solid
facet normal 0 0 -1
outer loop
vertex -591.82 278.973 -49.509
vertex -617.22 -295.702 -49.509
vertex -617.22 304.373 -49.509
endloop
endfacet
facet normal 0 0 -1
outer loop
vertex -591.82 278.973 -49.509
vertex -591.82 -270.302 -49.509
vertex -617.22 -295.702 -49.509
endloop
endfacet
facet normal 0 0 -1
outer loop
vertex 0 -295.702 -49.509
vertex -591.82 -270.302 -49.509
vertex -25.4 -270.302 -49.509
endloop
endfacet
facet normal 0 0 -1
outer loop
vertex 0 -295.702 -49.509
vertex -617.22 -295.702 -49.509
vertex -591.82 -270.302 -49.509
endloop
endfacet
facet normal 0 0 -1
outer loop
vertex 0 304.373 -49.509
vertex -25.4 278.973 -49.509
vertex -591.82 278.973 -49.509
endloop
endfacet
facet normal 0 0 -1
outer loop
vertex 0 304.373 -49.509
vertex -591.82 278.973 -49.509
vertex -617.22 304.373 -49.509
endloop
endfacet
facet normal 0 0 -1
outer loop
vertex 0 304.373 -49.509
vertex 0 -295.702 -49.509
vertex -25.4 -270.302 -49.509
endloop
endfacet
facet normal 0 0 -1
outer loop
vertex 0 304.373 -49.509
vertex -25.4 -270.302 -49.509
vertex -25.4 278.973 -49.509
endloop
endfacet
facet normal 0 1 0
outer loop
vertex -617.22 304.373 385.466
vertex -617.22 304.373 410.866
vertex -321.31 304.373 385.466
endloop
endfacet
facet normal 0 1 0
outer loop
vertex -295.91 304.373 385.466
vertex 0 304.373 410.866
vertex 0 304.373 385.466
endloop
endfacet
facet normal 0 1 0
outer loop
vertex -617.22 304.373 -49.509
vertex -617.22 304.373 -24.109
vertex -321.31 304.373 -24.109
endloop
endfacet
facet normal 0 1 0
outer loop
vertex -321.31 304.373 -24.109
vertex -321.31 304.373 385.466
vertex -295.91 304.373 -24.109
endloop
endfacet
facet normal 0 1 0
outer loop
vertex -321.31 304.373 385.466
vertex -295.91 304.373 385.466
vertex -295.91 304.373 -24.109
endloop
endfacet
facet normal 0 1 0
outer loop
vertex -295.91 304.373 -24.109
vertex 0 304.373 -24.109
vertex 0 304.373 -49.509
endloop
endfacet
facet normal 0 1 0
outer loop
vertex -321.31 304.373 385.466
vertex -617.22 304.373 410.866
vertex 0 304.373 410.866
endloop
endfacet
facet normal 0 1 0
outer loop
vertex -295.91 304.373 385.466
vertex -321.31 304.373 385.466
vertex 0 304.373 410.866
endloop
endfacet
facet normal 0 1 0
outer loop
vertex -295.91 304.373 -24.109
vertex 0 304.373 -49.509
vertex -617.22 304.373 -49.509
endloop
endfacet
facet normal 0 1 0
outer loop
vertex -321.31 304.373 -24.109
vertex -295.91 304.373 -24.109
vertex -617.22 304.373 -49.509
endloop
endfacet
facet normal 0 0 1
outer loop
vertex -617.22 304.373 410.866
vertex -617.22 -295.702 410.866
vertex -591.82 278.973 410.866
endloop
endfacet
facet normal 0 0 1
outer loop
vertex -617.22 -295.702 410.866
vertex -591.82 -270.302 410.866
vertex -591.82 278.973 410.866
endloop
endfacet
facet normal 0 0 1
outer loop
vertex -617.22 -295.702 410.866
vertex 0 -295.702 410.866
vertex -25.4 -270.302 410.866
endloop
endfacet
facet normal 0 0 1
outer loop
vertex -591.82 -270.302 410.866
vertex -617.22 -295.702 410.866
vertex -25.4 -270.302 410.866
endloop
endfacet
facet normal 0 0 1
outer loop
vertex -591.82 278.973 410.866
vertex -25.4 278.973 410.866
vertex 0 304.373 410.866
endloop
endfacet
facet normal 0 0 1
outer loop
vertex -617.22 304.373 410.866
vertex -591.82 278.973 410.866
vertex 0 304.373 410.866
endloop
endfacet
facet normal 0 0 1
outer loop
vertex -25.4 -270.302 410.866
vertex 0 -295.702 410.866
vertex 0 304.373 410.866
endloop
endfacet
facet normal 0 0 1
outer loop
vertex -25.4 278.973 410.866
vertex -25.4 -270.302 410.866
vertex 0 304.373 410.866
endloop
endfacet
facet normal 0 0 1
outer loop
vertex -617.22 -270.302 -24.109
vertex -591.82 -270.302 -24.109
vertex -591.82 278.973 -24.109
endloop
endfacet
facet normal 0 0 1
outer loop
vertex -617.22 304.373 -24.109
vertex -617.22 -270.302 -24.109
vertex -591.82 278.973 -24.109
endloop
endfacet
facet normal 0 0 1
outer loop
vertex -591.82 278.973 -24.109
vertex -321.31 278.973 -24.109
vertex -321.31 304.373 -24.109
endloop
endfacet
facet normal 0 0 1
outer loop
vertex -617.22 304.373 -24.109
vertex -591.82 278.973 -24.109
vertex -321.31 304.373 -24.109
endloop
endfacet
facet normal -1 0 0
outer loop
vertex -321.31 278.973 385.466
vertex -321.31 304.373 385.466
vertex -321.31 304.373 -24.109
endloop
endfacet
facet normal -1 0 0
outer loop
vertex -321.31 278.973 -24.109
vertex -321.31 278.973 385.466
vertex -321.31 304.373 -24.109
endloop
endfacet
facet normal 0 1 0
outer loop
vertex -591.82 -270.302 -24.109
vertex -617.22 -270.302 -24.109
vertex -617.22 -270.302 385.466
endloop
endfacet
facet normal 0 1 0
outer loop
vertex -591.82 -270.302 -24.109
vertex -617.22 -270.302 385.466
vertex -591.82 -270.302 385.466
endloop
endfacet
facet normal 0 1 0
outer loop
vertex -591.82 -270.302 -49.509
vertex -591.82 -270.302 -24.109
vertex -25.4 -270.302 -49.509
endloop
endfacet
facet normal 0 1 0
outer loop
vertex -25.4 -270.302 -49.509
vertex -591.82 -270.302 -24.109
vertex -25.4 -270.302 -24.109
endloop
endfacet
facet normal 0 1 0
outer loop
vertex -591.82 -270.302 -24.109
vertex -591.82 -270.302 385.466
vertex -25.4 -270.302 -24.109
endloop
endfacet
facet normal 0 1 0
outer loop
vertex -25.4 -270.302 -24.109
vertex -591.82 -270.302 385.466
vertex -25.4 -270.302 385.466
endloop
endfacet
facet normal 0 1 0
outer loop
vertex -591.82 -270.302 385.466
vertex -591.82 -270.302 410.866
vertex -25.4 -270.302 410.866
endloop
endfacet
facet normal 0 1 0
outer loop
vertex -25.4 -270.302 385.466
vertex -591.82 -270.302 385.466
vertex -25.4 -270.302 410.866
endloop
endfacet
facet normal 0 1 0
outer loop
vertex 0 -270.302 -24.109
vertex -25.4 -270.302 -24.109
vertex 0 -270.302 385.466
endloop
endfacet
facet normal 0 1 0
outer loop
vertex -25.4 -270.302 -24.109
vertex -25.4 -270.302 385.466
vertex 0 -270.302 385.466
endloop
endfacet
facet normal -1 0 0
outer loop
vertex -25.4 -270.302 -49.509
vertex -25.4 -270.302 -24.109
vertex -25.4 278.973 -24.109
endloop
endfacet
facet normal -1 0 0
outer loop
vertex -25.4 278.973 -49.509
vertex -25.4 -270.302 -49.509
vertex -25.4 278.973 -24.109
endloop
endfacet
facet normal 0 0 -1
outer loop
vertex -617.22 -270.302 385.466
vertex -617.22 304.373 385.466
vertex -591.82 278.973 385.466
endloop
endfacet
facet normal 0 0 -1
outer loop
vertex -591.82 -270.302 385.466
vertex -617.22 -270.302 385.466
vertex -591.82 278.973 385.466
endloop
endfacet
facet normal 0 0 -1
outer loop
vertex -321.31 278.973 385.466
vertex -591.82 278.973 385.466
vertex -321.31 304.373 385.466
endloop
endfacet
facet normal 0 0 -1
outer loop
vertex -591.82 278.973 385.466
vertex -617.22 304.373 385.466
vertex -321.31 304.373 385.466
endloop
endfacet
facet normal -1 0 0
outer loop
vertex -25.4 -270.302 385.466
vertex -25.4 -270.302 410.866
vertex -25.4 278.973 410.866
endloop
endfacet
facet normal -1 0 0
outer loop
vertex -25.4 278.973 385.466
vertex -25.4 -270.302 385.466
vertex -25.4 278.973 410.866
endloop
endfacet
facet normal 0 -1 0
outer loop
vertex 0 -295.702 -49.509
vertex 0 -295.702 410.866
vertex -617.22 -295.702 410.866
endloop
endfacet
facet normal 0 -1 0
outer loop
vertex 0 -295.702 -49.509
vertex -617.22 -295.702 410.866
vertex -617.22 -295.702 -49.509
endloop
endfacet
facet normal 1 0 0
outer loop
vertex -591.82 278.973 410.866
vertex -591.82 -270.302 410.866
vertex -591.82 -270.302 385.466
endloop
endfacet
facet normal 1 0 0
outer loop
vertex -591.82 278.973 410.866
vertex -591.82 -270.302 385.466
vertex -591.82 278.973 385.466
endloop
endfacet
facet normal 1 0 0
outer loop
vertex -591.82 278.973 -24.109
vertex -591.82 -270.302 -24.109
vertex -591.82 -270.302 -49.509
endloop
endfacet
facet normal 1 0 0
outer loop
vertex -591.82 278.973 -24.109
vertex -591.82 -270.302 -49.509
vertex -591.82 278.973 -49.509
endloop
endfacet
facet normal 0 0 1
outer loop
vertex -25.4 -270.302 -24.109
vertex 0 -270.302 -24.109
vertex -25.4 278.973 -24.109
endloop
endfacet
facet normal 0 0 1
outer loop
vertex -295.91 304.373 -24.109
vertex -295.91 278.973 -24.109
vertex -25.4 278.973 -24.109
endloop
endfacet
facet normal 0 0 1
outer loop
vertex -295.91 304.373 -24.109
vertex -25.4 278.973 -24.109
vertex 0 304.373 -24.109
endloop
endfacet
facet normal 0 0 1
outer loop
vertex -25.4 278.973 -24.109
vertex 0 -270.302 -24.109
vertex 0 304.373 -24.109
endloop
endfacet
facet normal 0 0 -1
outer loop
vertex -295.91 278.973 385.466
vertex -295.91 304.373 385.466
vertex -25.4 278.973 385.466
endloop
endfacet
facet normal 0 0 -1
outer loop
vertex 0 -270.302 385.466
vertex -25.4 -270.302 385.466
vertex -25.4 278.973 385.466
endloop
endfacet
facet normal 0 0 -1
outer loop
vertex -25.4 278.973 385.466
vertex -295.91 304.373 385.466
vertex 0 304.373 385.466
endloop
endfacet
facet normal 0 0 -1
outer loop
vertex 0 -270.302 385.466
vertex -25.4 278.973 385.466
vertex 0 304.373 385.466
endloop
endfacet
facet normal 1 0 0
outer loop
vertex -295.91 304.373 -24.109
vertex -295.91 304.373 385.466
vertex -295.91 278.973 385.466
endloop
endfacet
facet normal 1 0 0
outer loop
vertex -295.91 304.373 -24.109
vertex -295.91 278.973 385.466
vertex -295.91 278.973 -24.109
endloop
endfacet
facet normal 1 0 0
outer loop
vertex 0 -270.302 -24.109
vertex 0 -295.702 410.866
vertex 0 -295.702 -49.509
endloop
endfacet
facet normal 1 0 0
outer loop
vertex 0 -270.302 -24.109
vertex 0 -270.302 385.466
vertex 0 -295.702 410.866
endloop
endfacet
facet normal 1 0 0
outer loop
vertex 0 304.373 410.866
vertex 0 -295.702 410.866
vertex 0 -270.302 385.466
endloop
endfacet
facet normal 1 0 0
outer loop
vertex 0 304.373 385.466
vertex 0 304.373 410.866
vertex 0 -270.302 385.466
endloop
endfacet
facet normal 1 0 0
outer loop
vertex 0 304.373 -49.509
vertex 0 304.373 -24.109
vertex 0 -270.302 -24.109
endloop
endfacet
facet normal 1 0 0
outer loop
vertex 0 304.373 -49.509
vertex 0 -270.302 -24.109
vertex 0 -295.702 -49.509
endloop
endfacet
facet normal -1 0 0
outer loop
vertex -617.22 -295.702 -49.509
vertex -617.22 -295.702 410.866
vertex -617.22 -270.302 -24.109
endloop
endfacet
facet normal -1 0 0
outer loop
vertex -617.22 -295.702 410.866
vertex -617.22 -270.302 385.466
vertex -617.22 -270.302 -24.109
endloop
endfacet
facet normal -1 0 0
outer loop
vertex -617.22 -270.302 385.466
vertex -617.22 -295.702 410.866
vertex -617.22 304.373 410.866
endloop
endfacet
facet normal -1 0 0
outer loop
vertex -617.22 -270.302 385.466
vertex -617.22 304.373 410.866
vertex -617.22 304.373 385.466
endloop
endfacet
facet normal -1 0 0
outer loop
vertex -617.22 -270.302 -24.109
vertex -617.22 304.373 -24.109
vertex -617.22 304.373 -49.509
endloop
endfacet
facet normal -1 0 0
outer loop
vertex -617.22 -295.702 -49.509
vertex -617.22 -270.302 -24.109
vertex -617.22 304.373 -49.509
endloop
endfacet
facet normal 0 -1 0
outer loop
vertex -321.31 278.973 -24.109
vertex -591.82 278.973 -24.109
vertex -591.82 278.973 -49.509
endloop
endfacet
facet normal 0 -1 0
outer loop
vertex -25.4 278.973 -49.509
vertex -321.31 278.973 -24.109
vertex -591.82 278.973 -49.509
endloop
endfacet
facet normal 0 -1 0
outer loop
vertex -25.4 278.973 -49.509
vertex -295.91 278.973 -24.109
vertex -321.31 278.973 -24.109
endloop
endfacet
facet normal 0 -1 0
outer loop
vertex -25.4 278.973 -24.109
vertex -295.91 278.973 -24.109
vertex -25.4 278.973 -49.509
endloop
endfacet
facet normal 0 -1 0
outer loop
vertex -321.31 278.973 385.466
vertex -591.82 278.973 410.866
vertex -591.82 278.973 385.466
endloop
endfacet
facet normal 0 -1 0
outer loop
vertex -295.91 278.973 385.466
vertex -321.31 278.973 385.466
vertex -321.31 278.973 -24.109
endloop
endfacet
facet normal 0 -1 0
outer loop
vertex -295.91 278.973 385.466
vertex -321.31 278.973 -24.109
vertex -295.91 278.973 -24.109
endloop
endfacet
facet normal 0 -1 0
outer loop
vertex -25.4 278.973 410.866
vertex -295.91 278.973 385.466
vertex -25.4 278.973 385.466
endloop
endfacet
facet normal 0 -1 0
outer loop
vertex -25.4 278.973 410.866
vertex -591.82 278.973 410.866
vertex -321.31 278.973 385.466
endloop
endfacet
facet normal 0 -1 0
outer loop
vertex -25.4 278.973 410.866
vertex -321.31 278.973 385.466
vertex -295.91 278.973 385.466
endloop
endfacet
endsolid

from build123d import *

# Parameters (mm, degrees)
SKETCH1_W           = 460.375
SKETCH1_H           = 600.075
SKETCH1_W_2         = 409.575
SKETCH1_H_2         = 549.275
BOSS_EXTRUDE1_DEPTH = 617.22
SKETCH3_W           = 566.42
SKETCH3_H           = 549.275
CUT_EXTRUDE1_DEPTH  = 828.978611889
CUT_EXTRUDE2_REACH  = 955.867
SKETCH4_W           = 295.91
SKETCH4_H           = 409.575


with BuildPart() as part:
    # Sketch1 → Boss-Extrude1 (new body)
    with BuildSketch(Plane(origin=(0, 0, 0), x_dir=(0, 0, -1), z_dir=(1, 0, 0))):
        with Locations((-180.678434066, 4.335482901)):
            Rectangle(SKETCH1_W, SKETCH1_H)
        with Locations((-180.678434066, 4.335482901)):
            Rectangle(SKETCH1_W_2, SKETCH1_H_2, mode=Mode.SUBTRACT)
    extrude(amount=-BOSS_EXTRUDE1_DEPTH)

    # Sketch3 → Cut-Extrude1 (cut, through all)
    with BuildSketch(Plane.XY.offset(410.865934066)):
        with Locations((-308.61, 4.335482901)):
            Rectangle(SKETCH3_W, SKETCH3_H)
    extrude(amount=-CUT_EXTRUDE1_DEPTH, mode=Mode.SUBTRACT)

    # Sketch4 → Cut-Extrude2 (cut, up to next)
    with BuildSketch(Plane(origin=(0, 304.372982901, 0), x_dir=(1, 0, 0), z_dir=(0, 1, 0)), mode=Mode.PRIVATE) as cut_extrude2_sk1:
        with Locations((-469.265, -180.678434066)):
            Rectangle(SKETCH4_W, SKETCH4_H)
    cut_extrude2_tool1 = extrude(cut_extrude2_sk1.sketch, amount=-CUT_EXTRUDE2_REACH, mode=Mode.PRIVATE) & part.part
    # Sketch4 → Cut-Extrude2 (cut, up to next)
    with BuildSketch(Plane(origin=(0, 304.372982901, 0), x_dir=(1, 0, 0), z_dir=(0, 1, 0)), mode=Mode.PRIVATE) as cut_extrude2_sk2:
        with Locations((-147.955, -180.678434066)):
            Rectangle(SKETCH4_W, SKETCH4_H)
    cut_extrude2_tool2 = extrude(cut_extrude2_sk2.sketch, amount=-CUT_EXTRUDE2_REACH, mode=Mode.PRIVATE) & part.part
    add(cut_extrude2_tool1.solids().sort_by_distance((-469.265, 304.372983, 180.678434))[0], mode=Mode.SUBTRACT)
    add(cut_extrude2_tool2.solids().sort_by_distance((-147.955, 304.372983, 180.678434))[0], mode=Mode.SUBTRACT)


solid = part.part
